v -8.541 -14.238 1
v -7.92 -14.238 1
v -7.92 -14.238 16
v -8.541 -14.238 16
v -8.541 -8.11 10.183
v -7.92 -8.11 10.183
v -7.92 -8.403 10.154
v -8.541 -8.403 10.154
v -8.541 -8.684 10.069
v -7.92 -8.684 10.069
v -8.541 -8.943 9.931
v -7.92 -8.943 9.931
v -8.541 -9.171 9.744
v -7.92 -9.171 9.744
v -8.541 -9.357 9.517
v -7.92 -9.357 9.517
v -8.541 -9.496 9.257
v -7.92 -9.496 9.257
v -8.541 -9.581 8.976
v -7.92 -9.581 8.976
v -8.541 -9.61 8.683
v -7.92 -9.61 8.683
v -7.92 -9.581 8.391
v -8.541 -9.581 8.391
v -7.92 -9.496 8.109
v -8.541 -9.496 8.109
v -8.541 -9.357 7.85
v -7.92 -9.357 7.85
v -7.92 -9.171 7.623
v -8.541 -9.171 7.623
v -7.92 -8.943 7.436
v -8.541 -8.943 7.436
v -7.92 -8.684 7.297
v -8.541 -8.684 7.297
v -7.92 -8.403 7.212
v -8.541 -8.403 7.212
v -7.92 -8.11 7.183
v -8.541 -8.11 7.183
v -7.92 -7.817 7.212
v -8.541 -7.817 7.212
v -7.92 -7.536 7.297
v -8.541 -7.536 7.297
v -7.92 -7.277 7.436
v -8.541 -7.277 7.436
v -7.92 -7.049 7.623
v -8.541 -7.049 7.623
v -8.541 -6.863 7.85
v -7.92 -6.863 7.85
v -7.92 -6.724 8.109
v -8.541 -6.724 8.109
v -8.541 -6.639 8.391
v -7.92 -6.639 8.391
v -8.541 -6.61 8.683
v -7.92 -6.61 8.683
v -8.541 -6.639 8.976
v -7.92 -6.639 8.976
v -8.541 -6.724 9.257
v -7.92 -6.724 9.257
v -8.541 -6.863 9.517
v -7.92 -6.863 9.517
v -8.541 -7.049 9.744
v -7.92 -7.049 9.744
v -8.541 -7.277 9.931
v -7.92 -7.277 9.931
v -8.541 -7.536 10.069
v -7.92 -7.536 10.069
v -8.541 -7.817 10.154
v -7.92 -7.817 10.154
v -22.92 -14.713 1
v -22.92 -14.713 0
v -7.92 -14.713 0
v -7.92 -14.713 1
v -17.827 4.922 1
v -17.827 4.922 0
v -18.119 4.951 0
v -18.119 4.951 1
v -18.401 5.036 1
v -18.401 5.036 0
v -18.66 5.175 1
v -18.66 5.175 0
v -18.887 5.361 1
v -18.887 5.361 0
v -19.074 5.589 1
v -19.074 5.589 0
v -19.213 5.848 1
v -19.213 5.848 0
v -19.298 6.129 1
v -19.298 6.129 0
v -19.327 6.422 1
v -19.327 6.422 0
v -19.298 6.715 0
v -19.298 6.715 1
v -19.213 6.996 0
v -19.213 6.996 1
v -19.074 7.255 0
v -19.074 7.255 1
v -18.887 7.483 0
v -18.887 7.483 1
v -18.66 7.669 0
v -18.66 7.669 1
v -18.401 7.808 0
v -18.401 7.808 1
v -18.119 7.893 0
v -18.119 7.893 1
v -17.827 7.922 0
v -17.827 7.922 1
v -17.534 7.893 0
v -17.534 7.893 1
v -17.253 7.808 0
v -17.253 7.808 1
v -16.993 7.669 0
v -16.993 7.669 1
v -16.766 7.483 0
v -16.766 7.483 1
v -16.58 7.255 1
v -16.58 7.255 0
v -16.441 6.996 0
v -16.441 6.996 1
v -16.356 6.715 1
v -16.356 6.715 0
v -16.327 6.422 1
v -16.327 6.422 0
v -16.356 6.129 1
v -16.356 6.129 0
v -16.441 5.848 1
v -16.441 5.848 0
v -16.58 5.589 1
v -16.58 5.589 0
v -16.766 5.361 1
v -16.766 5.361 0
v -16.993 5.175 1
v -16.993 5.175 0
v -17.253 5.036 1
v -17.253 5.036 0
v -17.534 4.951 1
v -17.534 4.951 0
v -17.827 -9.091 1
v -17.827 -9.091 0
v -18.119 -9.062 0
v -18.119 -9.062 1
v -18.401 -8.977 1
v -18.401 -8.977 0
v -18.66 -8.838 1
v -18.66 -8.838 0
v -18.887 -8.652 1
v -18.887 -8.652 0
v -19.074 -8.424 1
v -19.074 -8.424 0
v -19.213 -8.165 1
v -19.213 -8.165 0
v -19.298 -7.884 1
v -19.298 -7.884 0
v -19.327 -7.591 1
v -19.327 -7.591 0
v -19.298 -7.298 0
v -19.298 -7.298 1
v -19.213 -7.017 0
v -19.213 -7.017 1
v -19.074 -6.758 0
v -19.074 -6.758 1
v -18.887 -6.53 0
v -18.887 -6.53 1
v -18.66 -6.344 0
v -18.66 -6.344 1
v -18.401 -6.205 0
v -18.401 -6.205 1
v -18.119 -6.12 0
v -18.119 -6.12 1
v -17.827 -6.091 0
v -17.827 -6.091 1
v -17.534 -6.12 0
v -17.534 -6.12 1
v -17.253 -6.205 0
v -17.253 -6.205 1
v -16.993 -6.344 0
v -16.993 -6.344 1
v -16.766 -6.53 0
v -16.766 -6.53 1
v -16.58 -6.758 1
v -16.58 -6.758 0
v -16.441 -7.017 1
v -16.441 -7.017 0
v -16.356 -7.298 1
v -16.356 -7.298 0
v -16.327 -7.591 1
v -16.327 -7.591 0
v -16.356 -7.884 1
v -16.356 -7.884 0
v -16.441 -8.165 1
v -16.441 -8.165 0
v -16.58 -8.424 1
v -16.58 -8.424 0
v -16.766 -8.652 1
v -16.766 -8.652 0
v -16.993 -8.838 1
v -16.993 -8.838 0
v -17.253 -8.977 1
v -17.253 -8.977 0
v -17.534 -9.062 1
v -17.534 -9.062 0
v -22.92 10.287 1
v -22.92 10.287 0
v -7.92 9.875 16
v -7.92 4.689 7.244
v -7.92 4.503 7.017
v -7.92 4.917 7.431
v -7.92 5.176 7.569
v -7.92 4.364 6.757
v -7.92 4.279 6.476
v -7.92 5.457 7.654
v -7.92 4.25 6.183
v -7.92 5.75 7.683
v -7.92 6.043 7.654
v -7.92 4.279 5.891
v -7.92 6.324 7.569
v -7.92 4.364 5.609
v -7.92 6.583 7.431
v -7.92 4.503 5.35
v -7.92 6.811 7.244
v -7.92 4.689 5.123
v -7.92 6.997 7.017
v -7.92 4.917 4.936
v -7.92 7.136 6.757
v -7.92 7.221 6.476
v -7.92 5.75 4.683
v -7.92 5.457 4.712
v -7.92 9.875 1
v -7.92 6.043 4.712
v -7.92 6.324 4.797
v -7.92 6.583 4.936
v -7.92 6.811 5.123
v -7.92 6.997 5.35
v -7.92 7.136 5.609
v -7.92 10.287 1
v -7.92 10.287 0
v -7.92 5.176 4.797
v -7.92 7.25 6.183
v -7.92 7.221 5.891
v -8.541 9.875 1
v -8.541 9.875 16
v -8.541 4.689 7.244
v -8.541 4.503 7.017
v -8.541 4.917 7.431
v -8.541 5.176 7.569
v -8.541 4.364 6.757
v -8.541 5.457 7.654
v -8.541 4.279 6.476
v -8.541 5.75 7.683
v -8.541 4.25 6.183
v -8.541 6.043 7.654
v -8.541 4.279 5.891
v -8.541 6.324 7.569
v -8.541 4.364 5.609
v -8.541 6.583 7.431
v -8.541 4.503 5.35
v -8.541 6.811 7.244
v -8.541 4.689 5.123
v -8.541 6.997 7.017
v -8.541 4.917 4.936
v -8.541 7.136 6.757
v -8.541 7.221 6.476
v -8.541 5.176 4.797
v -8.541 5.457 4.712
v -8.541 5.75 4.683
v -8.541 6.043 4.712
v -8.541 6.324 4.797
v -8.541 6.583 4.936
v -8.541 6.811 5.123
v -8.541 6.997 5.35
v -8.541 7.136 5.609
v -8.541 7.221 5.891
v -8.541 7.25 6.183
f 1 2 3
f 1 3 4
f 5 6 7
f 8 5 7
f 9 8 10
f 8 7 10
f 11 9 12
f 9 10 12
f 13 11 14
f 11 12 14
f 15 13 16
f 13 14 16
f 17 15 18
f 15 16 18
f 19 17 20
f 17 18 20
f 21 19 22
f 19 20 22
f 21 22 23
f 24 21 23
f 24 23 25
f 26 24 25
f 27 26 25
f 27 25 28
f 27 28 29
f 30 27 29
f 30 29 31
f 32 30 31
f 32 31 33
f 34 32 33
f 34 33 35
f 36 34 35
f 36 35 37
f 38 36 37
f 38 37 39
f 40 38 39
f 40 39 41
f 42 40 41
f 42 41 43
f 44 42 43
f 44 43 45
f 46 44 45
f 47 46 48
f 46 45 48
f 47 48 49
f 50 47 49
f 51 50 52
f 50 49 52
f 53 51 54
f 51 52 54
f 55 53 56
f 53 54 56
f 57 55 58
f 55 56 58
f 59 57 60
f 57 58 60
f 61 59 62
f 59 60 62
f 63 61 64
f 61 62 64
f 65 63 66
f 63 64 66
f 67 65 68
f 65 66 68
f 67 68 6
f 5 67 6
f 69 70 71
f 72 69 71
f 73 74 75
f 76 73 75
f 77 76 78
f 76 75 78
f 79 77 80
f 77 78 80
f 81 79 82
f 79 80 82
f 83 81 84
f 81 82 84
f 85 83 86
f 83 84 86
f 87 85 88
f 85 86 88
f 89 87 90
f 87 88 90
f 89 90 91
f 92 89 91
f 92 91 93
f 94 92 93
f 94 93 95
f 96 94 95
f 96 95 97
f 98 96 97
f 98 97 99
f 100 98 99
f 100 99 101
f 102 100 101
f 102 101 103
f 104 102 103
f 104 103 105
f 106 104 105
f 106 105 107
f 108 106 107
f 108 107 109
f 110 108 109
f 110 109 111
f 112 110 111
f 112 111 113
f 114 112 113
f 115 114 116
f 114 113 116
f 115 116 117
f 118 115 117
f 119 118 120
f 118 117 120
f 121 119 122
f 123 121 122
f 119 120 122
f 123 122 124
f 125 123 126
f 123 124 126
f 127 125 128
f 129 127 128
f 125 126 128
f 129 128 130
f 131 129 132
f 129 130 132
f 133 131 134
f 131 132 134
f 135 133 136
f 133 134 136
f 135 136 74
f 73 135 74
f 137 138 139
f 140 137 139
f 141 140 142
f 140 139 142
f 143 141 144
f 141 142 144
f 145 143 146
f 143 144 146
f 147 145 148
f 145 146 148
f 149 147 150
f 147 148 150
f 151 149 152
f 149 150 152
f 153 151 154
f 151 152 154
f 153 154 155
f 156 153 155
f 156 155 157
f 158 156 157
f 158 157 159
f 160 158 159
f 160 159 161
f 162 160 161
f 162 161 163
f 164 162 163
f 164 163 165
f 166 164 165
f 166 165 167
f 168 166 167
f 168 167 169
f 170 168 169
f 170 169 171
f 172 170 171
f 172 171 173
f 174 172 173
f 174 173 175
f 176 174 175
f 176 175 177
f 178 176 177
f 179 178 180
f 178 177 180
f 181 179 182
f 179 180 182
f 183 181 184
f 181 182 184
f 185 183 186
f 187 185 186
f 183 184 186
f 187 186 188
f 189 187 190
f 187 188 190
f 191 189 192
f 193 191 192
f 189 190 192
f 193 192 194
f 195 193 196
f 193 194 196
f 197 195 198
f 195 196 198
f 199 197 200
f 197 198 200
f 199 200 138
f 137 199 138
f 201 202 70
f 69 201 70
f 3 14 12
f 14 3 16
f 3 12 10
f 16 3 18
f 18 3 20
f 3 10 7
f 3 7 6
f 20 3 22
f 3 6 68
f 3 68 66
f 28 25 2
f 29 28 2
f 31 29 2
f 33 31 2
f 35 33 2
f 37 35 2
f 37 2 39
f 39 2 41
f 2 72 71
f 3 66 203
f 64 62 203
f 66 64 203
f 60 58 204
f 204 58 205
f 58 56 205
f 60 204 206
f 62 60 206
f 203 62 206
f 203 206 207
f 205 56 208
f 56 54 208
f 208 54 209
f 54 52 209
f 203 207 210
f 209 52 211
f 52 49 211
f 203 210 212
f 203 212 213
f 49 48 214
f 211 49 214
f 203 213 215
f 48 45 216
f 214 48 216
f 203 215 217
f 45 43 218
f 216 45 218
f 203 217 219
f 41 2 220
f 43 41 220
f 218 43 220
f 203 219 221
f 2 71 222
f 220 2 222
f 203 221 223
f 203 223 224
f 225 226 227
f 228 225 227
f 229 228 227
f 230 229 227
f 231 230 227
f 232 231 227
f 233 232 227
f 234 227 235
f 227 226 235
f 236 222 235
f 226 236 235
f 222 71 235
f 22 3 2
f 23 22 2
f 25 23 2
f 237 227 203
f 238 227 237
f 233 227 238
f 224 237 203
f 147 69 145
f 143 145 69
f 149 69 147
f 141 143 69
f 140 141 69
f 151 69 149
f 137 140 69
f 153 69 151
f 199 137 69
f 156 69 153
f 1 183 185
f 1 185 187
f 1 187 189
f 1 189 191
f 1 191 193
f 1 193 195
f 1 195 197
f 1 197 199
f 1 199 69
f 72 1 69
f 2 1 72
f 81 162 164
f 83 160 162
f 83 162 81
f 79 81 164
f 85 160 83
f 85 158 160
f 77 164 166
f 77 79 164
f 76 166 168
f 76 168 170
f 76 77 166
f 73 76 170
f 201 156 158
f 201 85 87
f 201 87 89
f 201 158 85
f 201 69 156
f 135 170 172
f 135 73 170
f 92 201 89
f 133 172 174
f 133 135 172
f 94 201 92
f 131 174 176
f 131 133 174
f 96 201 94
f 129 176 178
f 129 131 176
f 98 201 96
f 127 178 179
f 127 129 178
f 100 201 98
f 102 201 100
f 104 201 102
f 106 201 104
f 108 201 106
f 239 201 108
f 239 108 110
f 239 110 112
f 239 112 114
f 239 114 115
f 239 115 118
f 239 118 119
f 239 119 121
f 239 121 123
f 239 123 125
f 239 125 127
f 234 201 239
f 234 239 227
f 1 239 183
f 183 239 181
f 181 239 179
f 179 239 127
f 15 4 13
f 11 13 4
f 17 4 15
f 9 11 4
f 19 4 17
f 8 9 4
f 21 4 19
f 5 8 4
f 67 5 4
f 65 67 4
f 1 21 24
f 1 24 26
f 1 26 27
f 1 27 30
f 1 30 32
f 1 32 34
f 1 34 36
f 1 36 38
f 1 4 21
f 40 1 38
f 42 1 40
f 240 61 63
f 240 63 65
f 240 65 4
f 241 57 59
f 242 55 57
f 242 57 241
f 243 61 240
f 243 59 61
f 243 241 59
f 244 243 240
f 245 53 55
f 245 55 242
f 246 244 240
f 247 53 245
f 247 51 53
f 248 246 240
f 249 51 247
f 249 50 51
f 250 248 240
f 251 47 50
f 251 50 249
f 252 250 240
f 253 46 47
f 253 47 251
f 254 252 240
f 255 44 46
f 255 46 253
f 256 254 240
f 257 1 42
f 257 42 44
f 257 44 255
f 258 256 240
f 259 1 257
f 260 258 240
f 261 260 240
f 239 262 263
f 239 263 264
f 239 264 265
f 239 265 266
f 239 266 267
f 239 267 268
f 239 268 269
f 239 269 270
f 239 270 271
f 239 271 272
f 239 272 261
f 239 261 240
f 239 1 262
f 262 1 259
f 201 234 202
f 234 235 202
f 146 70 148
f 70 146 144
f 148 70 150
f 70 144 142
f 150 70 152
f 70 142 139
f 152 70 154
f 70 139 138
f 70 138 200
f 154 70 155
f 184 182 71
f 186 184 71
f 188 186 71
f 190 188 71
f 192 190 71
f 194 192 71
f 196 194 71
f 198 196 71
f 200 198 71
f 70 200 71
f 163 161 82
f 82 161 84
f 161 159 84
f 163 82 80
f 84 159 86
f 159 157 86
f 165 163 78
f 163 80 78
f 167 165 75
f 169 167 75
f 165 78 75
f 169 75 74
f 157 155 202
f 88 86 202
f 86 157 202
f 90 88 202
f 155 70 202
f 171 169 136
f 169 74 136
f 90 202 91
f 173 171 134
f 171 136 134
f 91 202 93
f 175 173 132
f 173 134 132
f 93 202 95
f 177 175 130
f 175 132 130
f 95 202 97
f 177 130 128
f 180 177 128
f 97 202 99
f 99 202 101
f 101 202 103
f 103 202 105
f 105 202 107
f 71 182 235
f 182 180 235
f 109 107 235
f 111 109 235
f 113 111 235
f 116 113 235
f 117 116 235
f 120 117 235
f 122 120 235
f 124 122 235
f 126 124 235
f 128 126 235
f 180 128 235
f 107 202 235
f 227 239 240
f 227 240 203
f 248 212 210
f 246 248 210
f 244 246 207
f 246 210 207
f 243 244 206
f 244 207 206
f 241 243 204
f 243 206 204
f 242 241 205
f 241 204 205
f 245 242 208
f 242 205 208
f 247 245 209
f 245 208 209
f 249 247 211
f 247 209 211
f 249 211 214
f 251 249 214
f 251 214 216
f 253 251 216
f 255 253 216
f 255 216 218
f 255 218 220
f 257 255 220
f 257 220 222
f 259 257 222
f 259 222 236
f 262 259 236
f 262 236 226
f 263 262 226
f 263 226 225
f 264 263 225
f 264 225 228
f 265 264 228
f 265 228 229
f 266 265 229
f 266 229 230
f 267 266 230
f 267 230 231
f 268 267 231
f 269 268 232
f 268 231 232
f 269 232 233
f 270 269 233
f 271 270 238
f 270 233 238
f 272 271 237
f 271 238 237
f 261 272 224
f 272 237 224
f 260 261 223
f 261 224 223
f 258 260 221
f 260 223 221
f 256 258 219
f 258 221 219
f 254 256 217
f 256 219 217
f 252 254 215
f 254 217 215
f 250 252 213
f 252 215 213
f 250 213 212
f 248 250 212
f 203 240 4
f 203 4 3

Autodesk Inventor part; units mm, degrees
ref_plane "YZ Plane" through (0, 0, 0) normal (1, 0, 0) x (0, 1, 0)
ref_plane "XZ Plane" through (0, 0, 0) normal (0, 1, 0) x (-1, 0, 0)
ref_plane "XY Plane" through (0, 0, 0) normal (0, 0, 1) x (1, 0, 0)
sketch "Sketch1" plane through (0, 0, 0) normal (0, 0, 1) x (1, 0, 0)
  line L0 (-7.9197, 10.2868) -> (-22.9197, 10.2868)
  line L1 (-22.9197, 10.2868) -> (-22.9197, -14.7132)
  line L2 (-22.9197, -14.7132) -> (-7.9197, -14.7132)
  line L3 (-7.9197, -14.7132) -> (-7.9197, 10.2868)
  point P0 (0, 0)
  dimension "d0" = 15
  dimension "d1" = 25
extrude "Extrusion1" add sketch "Sketch1" along normal blind 1
sketch "Sketch2" plane through (0, 0, 1) normal (0, 0, 1) x (1, 0, 0)
  circle A0 centre (-17.8268, 6.422) radius 2.5
  circle A1 centre (-17.8268, -7.5909) radius 2.5
  point P0 (0, 0)
  dimension "d4" = 5
  dimension "d5" = 5
hole "Hole1" at (-17.8268, 6.422, 1) at (-17.8268, -7.5909, 1) direction (0, 0, -1) diameter 3 end through all
sketch "Sketch3" plane through (0, 0, 1) normal (0, 0, 1) x (1, 0, 0)
  line L0 (-22.9197, -14.7132) -> (-7.9197, -14.7132) projected
  line L1 (-7.9197, 10.2868) -> (-22.9197, 10.2868) projected
  line L2 (-7.9197, -14.7132) -> (-7.9197, 10.2868) projected
  line L3 (-8.5412, 9.8751) -> (-7.9197, 9.8751)
  line L4 (-7.9197, 9.8751) -> (-7.9197, -14.2385)
  line L5 (-7.9197, -14.2385) -> (-8.5412, -14.2385)
  line L6 (-8.5412, -14.2385) -> (-8.5412, 9.8751)
  point P0 (0, 0)
  dimension "d13" = 25
  dimension "d14" = 15
extrude "Extrusion2" add sketch "Sketch3" along normal blind 15
sketch "Sketch4" plane through (-8.5412, -14.2385, 1) normal (-1, 0, 0) x (0, 0, 1)
  circle A0 centre (5.1833, 19.9887) radius 2.5
  circle A1 centre (7.6833, 6.1285) radius 2.5
  point P0 (-1, 14.2385)
  dimension "d17" = 5
  dimension "d18" = 5
hole "Hole2" at (-8.5412, 5.7501, 6.1833) at (-8.5412, -8.1101, 8.6833) direction (1, 0, 0) diameter 3 end through all
properties part number "L angle"
